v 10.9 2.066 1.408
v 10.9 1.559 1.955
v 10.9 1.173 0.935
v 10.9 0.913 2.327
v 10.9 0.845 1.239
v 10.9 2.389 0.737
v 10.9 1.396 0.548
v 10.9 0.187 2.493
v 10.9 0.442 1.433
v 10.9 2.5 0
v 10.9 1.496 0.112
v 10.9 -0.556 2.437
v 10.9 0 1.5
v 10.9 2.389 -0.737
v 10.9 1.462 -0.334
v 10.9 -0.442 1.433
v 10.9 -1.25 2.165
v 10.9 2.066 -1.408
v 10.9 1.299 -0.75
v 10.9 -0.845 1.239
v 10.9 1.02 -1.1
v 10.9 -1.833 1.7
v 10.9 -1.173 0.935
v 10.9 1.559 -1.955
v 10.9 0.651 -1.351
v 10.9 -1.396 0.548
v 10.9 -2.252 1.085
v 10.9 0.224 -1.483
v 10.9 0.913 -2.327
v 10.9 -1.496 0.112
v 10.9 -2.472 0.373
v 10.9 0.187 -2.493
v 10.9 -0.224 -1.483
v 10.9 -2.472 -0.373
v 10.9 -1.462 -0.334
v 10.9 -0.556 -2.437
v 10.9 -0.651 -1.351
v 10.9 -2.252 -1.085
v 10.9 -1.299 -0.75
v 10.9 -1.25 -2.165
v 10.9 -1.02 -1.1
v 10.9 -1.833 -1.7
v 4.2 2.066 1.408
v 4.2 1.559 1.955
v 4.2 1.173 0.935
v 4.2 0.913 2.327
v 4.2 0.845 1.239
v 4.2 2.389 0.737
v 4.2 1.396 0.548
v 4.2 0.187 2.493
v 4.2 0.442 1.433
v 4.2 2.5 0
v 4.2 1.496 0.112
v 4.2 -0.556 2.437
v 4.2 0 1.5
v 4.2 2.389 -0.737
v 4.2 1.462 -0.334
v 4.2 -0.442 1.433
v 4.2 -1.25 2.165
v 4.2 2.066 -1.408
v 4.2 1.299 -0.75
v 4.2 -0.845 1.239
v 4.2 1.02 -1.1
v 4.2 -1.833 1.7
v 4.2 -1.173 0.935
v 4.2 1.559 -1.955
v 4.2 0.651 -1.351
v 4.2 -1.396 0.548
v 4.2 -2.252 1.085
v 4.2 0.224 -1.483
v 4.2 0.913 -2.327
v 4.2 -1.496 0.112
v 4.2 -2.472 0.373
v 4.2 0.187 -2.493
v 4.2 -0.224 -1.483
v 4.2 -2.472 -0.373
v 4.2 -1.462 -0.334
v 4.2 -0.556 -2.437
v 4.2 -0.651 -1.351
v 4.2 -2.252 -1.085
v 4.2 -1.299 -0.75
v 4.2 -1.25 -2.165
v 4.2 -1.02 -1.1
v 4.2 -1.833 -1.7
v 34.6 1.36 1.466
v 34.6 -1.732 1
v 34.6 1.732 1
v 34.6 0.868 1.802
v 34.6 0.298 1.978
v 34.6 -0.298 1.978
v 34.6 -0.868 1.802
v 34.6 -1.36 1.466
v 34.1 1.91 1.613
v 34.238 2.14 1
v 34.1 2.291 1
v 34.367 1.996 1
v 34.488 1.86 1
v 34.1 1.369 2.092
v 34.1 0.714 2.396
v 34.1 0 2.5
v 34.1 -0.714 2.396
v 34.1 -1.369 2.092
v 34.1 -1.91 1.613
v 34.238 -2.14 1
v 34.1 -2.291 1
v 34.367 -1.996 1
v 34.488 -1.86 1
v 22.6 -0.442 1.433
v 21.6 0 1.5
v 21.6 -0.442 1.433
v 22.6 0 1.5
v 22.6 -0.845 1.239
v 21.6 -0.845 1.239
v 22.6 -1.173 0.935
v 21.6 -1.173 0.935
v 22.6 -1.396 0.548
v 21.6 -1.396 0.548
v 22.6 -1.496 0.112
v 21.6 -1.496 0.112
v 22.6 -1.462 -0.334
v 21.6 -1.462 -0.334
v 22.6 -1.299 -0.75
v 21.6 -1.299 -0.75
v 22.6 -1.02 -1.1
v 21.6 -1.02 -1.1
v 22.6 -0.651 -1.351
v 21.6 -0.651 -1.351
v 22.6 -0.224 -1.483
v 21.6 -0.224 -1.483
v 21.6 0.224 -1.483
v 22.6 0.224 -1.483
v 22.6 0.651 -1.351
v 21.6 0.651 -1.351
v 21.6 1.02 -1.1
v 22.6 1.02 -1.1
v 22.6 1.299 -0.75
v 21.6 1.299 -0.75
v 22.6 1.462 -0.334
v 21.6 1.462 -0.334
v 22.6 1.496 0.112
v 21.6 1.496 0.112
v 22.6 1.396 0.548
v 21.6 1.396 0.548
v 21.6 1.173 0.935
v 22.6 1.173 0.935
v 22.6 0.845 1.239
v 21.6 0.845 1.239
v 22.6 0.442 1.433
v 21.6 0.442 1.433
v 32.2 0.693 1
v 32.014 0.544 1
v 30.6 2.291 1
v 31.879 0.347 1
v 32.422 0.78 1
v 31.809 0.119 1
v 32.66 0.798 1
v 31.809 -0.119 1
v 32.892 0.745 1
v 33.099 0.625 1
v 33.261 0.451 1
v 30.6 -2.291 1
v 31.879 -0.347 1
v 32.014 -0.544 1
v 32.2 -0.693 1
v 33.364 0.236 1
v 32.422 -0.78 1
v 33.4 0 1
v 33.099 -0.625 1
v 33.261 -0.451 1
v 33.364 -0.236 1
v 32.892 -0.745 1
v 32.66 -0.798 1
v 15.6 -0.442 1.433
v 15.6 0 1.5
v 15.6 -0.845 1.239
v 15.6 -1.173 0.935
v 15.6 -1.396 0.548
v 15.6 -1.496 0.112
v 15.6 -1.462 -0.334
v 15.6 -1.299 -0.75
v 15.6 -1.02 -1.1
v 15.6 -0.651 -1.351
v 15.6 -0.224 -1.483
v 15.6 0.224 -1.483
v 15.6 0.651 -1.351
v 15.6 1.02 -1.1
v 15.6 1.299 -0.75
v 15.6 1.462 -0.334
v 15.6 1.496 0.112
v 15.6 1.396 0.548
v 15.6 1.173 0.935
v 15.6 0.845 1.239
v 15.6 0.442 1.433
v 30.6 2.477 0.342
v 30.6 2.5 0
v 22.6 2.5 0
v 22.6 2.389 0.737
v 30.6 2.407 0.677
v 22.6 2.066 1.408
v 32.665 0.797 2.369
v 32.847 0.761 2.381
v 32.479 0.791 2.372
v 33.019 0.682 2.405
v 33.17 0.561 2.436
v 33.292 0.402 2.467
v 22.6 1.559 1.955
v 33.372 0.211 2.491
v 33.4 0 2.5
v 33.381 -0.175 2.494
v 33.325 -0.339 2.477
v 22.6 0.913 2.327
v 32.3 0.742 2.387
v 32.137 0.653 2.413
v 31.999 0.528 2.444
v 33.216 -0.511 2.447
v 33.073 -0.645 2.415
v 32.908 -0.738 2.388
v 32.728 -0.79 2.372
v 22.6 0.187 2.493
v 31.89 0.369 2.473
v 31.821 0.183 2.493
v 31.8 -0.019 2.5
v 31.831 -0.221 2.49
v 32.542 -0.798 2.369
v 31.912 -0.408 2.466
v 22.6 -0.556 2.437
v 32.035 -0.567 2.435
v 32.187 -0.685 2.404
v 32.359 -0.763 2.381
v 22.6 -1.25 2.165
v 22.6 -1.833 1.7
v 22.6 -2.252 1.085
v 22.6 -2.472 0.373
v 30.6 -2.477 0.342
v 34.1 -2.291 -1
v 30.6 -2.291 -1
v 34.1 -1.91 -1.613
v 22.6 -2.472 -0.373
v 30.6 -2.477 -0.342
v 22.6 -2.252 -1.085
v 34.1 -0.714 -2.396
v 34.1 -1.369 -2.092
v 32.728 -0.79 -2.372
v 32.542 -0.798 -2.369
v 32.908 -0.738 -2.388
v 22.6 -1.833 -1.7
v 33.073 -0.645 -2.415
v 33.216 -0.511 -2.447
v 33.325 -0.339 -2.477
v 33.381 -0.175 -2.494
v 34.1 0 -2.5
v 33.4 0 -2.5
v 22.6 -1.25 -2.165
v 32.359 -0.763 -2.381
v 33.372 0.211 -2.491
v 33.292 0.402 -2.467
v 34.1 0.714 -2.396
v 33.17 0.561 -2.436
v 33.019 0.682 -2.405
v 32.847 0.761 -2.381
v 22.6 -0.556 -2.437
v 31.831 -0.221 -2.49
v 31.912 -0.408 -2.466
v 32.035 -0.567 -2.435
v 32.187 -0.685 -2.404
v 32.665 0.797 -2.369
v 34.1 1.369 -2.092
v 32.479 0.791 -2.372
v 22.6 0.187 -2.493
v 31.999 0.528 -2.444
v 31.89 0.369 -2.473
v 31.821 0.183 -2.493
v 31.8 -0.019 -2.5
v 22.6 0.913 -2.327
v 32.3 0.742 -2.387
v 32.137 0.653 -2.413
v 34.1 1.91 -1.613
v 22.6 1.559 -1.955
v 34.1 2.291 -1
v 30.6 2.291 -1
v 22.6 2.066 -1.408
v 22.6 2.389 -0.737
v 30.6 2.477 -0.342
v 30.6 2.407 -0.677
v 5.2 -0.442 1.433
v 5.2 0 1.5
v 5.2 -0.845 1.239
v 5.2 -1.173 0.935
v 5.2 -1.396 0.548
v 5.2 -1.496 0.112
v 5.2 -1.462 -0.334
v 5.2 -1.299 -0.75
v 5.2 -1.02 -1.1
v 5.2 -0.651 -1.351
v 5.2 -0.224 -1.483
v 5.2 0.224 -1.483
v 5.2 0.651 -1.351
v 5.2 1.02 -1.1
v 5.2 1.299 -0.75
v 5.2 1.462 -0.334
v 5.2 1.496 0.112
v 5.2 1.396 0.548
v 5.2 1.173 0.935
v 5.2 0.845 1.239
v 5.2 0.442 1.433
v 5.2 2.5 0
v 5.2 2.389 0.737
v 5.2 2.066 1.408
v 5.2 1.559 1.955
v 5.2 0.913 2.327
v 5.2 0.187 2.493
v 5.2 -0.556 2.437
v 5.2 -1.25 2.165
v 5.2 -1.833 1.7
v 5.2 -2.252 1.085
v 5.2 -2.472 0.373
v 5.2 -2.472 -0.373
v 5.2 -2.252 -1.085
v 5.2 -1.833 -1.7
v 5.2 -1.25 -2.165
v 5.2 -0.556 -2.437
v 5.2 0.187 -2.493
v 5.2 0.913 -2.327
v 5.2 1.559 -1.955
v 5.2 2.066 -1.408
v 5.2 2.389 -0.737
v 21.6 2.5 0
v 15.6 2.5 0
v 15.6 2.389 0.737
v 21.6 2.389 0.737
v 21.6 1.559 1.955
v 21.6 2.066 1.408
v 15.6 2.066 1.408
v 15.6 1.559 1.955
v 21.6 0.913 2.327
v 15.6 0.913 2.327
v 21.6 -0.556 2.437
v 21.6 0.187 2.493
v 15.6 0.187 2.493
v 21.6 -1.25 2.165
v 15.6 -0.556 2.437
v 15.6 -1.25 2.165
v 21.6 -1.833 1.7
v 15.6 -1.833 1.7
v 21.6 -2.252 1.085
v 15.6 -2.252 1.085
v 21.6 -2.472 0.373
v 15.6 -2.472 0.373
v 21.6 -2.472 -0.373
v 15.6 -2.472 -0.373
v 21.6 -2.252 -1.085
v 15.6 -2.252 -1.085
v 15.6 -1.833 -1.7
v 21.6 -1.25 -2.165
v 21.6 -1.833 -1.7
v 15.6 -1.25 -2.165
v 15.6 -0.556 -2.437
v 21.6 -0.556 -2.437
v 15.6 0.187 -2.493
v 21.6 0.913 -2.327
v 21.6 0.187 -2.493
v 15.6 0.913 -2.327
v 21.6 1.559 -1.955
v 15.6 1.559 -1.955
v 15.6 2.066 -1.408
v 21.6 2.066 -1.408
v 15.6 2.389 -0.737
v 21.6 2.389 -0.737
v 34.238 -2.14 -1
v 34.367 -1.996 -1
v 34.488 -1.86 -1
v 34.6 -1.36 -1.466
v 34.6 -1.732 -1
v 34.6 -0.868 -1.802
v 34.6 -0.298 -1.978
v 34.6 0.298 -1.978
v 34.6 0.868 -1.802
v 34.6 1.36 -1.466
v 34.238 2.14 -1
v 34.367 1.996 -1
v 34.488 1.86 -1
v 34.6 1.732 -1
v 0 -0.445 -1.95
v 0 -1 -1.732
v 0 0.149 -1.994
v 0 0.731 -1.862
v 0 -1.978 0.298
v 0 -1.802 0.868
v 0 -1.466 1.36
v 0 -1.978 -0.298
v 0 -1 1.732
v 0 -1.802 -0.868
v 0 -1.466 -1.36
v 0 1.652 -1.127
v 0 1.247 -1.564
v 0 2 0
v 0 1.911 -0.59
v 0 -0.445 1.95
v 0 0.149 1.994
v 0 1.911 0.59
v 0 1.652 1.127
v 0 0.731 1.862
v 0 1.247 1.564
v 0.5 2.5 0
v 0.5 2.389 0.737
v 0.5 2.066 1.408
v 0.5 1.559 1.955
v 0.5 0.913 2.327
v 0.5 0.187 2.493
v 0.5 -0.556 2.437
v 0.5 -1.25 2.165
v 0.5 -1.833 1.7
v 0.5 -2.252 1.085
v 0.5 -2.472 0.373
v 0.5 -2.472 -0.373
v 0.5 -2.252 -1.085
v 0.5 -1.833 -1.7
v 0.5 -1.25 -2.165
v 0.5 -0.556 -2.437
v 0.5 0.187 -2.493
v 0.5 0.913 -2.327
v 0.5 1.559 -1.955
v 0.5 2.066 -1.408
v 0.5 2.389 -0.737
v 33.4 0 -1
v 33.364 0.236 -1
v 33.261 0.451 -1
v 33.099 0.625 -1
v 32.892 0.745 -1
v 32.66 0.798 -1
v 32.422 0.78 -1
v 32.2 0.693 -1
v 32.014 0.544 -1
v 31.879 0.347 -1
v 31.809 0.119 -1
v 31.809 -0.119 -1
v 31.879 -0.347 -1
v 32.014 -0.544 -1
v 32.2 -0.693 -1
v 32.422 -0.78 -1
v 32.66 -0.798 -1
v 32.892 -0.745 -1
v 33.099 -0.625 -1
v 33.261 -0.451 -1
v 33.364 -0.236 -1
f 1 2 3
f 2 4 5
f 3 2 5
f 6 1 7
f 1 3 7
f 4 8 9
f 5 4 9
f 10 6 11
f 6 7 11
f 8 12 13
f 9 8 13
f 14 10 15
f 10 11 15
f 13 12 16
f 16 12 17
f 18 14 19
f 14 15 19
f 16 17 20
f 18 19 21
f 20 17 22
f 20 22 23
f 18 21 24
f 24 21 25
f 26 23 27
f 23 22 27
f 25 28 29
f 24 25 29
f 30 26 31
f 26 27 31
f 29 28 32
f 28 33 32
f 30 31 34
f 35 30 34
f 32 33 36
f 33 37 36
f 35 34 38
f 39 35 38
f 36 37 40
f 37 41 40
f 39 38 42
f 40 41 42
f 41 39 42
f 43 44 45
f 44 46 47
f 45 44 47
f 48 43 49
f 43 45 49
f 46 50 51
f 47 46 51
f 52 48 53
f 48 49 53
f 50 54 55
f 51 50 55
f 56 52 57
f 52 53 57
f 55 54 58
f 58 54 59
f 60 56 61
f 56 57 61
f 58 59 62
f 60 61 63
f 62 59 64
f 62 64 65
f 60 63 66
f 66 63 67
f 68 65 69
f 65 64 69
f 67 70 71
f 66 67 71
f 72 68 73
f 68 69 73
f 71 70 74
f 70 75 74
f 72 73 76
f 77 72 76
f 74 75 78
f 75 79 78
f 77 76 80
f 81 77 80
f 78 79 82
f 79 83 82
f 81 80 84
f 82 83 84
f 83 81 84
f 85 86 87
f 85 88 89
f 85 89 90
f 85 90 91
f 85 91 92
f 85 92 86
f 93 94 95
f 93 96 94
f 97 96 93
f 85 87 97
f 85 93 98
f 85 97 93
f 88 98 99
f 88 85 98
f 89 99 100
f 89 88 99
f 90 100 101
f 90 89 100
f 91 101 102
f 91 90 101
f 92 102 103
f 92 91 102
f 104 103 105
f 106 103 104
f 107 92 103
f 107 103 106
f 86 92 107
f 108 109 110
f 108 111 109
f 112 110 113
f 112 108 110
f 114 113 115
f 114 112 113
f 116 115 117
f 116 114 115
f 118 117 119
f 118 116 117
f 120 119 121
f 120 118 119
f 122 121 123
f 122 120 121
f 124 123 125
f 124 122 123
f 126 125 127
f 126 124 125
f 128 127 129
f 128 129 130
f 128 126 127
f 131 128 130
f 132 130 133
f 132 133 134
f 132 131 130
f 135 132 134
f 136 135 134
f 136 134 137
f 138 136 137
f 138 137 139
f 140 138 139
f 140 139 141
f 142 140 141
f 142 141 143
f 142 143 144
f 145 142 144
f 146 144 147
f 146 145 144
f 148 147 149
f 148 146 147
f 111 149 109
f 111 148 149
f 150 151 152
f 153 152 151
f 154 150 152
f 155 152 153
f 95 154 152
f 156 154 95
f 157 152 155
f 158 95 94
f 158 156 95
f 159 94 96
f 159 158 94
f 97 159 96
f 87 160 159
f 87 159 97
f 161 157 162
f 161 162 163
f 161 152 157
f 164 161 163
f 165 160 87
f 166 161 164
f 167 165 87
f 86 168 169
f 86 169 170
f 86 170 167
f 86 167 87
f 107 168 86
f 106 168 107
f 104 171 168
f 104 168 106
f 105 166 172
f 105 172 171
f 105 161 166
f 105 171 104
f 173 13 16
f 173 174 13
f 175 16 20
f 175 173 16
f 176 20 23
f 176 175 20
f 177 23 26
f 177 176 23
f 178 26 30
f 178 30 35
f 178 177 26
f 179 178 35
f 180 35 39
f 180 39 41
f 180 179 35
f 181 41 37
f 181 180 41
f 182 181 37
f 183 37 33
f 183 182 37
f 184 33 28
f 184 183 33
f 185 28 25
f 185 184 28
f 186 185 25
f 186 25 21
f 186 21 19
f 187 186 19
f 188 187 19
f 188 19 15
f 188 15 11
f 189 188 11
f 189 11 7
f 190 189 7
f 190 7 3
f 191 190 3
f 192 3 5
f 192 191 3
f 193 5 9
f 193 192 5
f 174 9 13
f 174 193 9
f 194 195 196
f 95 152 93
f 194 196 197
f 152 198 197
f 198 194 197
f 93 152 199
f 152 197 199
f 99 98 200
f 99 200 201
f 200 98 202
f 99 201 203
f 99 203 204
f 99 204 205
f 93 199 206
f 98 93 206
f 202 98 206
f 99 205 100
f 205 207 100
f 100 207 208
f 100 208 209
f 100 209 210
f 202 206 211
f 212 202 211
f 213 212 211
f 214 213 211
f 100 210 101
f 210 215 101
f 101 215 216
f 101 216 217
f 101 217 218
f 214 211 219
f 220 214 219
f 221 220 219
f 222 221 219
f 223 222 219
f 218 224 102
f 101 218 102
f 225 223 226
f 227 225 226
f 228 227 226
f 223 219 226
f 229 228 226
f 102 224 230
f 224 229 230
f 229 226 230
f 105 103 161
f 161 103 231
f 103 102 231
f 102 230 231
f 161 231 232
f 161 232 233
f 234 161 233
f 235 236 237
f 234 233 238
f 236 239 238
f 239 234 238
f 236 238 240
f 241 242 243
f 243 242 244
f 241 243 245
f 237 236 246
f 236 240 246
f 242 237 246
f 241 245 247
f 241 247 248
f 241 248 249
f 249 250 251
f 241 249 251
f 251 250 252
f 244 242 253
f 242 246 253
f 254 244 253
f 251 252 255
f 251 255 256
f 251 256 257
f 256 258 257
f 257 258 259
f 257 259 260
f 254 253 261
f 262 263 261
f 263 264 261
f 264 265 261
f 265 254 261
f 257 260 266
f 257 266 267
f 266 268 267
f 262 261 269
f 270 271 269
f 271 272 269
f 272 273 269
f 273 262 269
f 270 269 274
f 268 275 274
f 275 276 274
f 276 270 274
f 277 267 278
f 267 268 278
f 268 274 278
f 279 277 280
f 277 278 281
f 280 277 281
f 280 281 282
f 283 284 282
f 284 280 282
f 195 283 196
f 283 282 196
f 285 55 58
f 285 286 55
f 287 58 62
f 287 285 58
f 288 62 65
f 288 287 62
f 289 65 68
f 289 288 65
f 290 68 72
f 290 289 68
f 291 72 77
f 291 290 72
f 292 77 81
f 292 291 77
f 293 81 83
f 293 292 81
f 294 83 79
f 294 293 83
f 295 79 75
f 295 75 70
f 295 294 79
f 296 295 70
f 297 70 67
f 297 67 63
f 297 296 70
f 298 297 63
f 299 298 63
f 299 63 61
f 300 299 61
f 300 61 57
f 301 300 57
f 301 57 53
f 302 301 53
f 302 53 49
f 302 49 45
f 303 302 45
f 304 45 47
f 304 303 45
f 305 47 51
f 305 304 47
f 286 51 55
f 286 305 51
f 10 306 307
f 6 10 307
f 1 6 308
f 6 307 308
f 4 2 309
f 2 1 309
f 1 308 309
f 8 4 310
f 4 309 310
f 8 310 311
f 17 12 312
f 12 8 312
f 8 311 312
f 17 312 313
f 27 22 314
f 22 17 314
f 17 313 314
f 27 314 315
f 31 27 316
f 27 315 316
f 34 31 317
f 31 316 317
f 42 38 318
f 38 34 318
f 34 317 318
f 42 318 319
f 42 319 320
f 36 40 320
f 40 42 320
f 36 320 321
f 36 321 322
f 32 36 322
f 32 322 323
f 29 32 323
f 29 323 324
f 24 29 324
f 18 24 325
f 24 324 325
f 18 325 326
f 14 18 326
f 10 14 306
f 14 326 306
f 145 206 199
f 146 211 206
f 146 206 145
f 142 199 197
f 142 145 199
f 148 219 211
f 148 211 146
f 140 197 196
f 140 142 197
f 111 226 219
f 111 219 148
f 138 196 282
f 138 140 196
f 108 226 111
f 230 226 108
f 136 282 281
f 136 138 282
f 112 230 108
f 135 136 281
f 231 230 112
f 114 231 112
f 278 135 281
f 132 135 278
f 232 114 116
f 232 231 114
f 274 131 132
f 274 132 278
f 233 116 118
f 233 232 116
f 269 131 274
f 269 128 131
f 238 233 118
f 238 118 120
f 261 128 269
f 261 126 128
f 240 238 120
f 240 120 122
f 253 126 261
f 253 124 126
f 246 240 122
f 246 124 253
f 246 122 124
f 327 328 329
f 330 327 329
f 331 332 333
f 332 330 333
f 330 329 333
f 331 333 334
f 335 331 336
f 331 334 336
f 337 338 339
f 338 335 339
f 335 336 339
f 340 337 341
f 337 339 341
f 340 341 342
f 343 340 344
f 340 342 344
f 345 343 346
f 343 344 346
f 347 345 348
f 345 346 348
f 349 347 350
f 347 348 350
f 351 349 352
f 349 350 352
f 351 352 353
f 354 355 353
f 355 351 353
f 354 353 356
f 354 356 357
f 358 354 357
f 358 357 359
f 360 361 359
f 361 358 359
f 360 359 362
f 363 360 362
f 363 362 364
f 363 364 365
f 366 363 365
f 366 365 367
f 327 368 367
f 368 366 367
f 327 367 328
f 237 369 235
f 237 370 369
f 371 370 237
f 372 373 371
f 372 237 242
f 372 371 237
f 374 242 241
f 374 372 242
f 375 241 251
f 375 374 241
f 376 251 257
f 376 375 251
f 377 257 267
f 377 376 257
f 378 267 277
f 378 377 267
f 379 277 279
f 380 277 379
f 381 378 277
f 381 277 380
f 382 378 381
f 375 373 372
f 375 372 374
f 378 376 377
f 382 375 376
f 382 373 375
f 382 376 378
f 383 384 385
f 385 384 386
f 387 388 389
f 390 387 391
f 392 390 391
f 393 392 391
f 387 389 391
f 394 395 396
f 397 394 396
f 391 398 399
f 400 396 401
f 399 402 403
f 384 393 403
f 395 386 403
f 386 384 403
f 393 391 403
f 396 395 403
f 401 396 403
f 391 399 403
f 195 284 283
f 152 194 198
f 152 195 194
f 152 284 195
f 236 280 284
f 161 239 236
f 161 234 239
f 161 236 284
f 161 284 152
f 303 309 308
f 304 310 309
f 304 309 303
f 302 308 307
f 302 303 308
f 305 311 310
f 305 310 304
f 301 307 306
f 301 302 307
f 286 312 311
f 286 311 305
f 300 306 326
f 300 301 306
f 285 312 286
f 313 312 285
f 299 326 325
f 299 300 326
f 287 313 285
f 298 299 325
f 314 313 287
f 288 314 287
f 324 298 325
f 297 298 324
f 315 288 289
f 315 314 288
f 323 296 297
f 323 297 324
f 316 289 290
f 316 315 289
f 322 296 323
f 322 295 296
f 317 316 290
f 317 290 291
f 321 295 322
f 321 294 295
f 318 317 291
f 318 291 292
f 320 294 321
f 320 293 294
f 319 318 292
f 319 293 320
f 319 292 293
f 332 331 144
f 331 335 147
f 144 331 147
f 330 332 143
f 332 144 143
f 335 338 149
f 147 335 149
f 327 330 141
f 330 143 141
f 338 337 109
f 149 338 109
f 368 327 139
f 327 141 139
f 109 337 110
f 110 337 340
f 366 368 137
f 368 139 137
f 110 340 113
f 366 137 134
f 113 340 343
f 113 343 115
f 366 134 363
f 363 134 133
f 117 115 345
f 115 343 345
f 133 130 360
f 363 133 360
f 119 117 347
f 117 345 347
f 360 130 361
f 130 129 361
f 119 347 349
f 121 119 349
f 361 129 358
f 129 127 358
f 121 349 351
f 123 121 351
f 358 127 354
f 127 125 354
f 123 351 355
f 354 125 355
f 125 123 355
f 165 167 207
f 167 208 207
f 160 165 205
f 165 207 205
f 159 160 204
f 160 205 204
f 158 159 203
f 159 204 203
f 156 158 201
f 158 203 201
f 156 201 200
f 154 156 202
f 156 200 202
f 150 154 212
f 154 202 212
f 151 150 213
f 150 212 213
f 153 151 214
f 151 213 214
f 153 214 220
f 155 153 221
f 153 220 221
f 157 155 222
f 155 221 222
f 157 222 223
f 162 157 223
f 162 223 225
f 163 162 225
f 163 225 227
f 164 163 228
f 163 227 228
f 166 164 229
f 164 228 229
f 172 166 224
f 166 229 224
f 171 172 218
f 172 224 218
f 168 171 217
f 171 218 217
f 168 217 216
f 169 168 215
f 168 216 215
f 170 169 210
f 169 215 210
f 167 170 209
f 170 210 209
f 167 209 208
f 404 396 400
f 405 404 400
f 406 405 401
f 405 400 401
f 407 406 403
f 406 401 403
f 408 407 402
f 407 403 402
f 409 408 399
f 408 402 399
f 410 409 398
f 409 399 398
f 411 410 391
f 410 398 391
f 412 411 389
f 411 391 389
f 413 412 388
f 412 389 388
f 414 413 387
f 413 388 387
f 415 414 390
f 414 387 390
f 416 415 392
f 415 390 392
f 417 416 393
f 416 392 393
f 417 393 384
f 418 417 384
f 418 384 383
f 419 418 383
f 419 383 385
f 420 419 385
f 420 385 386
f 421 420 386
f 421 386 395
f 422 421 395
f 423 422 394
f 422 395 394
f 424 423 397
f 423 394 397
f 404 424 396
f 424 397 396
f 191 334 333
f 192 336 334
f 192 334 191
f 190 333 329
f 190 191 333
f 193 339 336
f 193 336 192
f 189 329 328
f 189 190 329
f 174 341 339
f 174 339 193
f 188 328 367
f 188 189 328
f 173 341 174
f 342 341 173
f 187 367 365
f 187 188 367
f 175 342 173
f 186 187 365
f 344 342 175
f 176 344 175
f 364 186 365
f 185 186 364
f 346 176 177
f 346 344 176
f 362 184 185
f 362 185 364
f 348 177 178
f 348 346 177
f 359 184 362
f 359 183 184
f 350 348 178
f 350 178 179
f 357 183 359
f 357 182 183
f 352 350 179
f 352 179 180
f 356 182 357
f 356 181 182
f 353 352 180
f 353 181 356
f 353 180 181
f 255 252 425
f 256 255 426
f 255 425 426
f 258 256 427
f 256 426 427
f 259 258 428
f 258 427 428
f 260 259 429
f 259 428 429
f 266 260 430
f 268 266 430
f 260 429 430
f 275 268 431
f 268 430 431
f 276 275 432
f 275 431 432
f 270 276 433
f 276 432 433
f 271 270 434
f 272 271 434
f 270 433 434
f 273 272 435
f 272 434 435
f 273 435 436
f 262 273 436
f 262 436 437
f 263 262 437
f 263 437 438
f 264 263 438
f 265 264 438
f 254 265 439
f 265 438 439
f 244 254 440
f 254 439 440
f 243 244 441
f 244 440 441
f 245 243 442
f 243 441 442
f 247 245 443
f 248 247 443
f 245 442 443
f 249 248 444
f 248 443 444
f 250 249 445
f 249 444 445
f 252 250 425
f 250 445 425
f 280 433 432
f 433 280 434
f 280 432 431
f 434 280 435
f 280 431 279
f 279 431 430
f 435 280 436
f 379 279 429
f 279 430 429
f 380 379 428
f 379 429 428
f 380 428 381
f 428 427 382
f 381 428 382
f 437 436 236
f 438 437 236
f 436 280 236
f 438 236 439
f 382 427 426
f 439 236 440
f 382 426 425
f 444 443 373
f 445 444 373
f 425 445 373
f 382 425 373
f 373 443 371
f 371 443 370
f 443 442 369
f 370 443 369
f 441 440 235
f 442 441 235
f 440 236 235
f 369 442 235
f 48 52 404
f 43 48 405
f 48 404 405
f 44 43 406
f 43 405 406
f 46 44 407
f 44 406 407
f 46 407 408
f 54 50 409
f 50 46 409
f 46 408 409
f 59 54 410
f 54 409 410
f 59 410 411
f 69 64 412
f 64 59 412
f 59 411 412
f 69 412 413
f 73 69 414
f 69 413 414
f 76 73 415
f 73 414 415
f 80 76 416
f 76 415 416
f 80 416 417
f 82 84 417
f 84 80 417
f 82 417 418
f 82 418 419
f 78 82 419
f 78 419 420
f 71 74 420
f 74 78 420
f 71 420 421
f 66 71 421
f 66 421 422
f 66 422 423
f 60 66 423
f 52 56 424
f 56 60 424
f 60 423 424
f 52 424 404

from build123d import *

# Parameters (mm, degrees)
F0_R     = 2.5
F1_DEPTH = 34.6
F2_W     = 1
F2_H     = 3
F2_W_2   = 4.7
F4_W     = 4
F4_H     = 2
F5_DEPTH = 12.5
F6_R     = 0.8
F7_DEPTH = 12.5
F8_SIZE  = 0.5


with BuildPart() as f1:
    # F0 (on Right) → F1 (new body)
    with BuildSketch(Plane.YZ):
        Circle(F0_R)
    extrude(amount=F1_DEPTH)

    # F2 (on Front) → F3 (revolve, cut)
    with BuildSketch(Plane.XZ):
        with Locations((4.7, 3)):
            Rectangle(F2_W, F2_H)
        with Locations((13.25, 3)):
            Rectangle(F2_W_2, F2_H)
        with Locations((22.1, 3)):
            Rectangle(F2_W, F2_H)
    revolve(axis=Axis((18.455703, 0, 0), (1, 0, 0)), mode=Mode.SUBTRACT)

    # F4 (on Front) → F5 (cut, symmetric)
    with BuildSketch(Plane.XZ):
        with Locations((32.6, 0)):
            Rectangle(F4_W, F4_H)
    extrude(amount=F5_DEPTH, both=True, mode=Mode.SUBTRACT)

    # F6 (on Top) → F7 (cut, symmetric)
    with BuildSketch(Plane.XY):
        with Locations((32.6, 0)):
            Circle(F6_R)
    extrude(amount=F7_DEPTH, both=True, mode=Mode.SUBTRACT)

    # F8
    f8_edges = [f1.edges().sort_by_distance(p)[0] for p in [
        (34.6, 0, -2.5),
        (34.6, 0, 2.5),
        (0, -2.5, 0),
    ]]
    chamfer(f8_edges, length=F8_SIZE)


solid = f1.part
